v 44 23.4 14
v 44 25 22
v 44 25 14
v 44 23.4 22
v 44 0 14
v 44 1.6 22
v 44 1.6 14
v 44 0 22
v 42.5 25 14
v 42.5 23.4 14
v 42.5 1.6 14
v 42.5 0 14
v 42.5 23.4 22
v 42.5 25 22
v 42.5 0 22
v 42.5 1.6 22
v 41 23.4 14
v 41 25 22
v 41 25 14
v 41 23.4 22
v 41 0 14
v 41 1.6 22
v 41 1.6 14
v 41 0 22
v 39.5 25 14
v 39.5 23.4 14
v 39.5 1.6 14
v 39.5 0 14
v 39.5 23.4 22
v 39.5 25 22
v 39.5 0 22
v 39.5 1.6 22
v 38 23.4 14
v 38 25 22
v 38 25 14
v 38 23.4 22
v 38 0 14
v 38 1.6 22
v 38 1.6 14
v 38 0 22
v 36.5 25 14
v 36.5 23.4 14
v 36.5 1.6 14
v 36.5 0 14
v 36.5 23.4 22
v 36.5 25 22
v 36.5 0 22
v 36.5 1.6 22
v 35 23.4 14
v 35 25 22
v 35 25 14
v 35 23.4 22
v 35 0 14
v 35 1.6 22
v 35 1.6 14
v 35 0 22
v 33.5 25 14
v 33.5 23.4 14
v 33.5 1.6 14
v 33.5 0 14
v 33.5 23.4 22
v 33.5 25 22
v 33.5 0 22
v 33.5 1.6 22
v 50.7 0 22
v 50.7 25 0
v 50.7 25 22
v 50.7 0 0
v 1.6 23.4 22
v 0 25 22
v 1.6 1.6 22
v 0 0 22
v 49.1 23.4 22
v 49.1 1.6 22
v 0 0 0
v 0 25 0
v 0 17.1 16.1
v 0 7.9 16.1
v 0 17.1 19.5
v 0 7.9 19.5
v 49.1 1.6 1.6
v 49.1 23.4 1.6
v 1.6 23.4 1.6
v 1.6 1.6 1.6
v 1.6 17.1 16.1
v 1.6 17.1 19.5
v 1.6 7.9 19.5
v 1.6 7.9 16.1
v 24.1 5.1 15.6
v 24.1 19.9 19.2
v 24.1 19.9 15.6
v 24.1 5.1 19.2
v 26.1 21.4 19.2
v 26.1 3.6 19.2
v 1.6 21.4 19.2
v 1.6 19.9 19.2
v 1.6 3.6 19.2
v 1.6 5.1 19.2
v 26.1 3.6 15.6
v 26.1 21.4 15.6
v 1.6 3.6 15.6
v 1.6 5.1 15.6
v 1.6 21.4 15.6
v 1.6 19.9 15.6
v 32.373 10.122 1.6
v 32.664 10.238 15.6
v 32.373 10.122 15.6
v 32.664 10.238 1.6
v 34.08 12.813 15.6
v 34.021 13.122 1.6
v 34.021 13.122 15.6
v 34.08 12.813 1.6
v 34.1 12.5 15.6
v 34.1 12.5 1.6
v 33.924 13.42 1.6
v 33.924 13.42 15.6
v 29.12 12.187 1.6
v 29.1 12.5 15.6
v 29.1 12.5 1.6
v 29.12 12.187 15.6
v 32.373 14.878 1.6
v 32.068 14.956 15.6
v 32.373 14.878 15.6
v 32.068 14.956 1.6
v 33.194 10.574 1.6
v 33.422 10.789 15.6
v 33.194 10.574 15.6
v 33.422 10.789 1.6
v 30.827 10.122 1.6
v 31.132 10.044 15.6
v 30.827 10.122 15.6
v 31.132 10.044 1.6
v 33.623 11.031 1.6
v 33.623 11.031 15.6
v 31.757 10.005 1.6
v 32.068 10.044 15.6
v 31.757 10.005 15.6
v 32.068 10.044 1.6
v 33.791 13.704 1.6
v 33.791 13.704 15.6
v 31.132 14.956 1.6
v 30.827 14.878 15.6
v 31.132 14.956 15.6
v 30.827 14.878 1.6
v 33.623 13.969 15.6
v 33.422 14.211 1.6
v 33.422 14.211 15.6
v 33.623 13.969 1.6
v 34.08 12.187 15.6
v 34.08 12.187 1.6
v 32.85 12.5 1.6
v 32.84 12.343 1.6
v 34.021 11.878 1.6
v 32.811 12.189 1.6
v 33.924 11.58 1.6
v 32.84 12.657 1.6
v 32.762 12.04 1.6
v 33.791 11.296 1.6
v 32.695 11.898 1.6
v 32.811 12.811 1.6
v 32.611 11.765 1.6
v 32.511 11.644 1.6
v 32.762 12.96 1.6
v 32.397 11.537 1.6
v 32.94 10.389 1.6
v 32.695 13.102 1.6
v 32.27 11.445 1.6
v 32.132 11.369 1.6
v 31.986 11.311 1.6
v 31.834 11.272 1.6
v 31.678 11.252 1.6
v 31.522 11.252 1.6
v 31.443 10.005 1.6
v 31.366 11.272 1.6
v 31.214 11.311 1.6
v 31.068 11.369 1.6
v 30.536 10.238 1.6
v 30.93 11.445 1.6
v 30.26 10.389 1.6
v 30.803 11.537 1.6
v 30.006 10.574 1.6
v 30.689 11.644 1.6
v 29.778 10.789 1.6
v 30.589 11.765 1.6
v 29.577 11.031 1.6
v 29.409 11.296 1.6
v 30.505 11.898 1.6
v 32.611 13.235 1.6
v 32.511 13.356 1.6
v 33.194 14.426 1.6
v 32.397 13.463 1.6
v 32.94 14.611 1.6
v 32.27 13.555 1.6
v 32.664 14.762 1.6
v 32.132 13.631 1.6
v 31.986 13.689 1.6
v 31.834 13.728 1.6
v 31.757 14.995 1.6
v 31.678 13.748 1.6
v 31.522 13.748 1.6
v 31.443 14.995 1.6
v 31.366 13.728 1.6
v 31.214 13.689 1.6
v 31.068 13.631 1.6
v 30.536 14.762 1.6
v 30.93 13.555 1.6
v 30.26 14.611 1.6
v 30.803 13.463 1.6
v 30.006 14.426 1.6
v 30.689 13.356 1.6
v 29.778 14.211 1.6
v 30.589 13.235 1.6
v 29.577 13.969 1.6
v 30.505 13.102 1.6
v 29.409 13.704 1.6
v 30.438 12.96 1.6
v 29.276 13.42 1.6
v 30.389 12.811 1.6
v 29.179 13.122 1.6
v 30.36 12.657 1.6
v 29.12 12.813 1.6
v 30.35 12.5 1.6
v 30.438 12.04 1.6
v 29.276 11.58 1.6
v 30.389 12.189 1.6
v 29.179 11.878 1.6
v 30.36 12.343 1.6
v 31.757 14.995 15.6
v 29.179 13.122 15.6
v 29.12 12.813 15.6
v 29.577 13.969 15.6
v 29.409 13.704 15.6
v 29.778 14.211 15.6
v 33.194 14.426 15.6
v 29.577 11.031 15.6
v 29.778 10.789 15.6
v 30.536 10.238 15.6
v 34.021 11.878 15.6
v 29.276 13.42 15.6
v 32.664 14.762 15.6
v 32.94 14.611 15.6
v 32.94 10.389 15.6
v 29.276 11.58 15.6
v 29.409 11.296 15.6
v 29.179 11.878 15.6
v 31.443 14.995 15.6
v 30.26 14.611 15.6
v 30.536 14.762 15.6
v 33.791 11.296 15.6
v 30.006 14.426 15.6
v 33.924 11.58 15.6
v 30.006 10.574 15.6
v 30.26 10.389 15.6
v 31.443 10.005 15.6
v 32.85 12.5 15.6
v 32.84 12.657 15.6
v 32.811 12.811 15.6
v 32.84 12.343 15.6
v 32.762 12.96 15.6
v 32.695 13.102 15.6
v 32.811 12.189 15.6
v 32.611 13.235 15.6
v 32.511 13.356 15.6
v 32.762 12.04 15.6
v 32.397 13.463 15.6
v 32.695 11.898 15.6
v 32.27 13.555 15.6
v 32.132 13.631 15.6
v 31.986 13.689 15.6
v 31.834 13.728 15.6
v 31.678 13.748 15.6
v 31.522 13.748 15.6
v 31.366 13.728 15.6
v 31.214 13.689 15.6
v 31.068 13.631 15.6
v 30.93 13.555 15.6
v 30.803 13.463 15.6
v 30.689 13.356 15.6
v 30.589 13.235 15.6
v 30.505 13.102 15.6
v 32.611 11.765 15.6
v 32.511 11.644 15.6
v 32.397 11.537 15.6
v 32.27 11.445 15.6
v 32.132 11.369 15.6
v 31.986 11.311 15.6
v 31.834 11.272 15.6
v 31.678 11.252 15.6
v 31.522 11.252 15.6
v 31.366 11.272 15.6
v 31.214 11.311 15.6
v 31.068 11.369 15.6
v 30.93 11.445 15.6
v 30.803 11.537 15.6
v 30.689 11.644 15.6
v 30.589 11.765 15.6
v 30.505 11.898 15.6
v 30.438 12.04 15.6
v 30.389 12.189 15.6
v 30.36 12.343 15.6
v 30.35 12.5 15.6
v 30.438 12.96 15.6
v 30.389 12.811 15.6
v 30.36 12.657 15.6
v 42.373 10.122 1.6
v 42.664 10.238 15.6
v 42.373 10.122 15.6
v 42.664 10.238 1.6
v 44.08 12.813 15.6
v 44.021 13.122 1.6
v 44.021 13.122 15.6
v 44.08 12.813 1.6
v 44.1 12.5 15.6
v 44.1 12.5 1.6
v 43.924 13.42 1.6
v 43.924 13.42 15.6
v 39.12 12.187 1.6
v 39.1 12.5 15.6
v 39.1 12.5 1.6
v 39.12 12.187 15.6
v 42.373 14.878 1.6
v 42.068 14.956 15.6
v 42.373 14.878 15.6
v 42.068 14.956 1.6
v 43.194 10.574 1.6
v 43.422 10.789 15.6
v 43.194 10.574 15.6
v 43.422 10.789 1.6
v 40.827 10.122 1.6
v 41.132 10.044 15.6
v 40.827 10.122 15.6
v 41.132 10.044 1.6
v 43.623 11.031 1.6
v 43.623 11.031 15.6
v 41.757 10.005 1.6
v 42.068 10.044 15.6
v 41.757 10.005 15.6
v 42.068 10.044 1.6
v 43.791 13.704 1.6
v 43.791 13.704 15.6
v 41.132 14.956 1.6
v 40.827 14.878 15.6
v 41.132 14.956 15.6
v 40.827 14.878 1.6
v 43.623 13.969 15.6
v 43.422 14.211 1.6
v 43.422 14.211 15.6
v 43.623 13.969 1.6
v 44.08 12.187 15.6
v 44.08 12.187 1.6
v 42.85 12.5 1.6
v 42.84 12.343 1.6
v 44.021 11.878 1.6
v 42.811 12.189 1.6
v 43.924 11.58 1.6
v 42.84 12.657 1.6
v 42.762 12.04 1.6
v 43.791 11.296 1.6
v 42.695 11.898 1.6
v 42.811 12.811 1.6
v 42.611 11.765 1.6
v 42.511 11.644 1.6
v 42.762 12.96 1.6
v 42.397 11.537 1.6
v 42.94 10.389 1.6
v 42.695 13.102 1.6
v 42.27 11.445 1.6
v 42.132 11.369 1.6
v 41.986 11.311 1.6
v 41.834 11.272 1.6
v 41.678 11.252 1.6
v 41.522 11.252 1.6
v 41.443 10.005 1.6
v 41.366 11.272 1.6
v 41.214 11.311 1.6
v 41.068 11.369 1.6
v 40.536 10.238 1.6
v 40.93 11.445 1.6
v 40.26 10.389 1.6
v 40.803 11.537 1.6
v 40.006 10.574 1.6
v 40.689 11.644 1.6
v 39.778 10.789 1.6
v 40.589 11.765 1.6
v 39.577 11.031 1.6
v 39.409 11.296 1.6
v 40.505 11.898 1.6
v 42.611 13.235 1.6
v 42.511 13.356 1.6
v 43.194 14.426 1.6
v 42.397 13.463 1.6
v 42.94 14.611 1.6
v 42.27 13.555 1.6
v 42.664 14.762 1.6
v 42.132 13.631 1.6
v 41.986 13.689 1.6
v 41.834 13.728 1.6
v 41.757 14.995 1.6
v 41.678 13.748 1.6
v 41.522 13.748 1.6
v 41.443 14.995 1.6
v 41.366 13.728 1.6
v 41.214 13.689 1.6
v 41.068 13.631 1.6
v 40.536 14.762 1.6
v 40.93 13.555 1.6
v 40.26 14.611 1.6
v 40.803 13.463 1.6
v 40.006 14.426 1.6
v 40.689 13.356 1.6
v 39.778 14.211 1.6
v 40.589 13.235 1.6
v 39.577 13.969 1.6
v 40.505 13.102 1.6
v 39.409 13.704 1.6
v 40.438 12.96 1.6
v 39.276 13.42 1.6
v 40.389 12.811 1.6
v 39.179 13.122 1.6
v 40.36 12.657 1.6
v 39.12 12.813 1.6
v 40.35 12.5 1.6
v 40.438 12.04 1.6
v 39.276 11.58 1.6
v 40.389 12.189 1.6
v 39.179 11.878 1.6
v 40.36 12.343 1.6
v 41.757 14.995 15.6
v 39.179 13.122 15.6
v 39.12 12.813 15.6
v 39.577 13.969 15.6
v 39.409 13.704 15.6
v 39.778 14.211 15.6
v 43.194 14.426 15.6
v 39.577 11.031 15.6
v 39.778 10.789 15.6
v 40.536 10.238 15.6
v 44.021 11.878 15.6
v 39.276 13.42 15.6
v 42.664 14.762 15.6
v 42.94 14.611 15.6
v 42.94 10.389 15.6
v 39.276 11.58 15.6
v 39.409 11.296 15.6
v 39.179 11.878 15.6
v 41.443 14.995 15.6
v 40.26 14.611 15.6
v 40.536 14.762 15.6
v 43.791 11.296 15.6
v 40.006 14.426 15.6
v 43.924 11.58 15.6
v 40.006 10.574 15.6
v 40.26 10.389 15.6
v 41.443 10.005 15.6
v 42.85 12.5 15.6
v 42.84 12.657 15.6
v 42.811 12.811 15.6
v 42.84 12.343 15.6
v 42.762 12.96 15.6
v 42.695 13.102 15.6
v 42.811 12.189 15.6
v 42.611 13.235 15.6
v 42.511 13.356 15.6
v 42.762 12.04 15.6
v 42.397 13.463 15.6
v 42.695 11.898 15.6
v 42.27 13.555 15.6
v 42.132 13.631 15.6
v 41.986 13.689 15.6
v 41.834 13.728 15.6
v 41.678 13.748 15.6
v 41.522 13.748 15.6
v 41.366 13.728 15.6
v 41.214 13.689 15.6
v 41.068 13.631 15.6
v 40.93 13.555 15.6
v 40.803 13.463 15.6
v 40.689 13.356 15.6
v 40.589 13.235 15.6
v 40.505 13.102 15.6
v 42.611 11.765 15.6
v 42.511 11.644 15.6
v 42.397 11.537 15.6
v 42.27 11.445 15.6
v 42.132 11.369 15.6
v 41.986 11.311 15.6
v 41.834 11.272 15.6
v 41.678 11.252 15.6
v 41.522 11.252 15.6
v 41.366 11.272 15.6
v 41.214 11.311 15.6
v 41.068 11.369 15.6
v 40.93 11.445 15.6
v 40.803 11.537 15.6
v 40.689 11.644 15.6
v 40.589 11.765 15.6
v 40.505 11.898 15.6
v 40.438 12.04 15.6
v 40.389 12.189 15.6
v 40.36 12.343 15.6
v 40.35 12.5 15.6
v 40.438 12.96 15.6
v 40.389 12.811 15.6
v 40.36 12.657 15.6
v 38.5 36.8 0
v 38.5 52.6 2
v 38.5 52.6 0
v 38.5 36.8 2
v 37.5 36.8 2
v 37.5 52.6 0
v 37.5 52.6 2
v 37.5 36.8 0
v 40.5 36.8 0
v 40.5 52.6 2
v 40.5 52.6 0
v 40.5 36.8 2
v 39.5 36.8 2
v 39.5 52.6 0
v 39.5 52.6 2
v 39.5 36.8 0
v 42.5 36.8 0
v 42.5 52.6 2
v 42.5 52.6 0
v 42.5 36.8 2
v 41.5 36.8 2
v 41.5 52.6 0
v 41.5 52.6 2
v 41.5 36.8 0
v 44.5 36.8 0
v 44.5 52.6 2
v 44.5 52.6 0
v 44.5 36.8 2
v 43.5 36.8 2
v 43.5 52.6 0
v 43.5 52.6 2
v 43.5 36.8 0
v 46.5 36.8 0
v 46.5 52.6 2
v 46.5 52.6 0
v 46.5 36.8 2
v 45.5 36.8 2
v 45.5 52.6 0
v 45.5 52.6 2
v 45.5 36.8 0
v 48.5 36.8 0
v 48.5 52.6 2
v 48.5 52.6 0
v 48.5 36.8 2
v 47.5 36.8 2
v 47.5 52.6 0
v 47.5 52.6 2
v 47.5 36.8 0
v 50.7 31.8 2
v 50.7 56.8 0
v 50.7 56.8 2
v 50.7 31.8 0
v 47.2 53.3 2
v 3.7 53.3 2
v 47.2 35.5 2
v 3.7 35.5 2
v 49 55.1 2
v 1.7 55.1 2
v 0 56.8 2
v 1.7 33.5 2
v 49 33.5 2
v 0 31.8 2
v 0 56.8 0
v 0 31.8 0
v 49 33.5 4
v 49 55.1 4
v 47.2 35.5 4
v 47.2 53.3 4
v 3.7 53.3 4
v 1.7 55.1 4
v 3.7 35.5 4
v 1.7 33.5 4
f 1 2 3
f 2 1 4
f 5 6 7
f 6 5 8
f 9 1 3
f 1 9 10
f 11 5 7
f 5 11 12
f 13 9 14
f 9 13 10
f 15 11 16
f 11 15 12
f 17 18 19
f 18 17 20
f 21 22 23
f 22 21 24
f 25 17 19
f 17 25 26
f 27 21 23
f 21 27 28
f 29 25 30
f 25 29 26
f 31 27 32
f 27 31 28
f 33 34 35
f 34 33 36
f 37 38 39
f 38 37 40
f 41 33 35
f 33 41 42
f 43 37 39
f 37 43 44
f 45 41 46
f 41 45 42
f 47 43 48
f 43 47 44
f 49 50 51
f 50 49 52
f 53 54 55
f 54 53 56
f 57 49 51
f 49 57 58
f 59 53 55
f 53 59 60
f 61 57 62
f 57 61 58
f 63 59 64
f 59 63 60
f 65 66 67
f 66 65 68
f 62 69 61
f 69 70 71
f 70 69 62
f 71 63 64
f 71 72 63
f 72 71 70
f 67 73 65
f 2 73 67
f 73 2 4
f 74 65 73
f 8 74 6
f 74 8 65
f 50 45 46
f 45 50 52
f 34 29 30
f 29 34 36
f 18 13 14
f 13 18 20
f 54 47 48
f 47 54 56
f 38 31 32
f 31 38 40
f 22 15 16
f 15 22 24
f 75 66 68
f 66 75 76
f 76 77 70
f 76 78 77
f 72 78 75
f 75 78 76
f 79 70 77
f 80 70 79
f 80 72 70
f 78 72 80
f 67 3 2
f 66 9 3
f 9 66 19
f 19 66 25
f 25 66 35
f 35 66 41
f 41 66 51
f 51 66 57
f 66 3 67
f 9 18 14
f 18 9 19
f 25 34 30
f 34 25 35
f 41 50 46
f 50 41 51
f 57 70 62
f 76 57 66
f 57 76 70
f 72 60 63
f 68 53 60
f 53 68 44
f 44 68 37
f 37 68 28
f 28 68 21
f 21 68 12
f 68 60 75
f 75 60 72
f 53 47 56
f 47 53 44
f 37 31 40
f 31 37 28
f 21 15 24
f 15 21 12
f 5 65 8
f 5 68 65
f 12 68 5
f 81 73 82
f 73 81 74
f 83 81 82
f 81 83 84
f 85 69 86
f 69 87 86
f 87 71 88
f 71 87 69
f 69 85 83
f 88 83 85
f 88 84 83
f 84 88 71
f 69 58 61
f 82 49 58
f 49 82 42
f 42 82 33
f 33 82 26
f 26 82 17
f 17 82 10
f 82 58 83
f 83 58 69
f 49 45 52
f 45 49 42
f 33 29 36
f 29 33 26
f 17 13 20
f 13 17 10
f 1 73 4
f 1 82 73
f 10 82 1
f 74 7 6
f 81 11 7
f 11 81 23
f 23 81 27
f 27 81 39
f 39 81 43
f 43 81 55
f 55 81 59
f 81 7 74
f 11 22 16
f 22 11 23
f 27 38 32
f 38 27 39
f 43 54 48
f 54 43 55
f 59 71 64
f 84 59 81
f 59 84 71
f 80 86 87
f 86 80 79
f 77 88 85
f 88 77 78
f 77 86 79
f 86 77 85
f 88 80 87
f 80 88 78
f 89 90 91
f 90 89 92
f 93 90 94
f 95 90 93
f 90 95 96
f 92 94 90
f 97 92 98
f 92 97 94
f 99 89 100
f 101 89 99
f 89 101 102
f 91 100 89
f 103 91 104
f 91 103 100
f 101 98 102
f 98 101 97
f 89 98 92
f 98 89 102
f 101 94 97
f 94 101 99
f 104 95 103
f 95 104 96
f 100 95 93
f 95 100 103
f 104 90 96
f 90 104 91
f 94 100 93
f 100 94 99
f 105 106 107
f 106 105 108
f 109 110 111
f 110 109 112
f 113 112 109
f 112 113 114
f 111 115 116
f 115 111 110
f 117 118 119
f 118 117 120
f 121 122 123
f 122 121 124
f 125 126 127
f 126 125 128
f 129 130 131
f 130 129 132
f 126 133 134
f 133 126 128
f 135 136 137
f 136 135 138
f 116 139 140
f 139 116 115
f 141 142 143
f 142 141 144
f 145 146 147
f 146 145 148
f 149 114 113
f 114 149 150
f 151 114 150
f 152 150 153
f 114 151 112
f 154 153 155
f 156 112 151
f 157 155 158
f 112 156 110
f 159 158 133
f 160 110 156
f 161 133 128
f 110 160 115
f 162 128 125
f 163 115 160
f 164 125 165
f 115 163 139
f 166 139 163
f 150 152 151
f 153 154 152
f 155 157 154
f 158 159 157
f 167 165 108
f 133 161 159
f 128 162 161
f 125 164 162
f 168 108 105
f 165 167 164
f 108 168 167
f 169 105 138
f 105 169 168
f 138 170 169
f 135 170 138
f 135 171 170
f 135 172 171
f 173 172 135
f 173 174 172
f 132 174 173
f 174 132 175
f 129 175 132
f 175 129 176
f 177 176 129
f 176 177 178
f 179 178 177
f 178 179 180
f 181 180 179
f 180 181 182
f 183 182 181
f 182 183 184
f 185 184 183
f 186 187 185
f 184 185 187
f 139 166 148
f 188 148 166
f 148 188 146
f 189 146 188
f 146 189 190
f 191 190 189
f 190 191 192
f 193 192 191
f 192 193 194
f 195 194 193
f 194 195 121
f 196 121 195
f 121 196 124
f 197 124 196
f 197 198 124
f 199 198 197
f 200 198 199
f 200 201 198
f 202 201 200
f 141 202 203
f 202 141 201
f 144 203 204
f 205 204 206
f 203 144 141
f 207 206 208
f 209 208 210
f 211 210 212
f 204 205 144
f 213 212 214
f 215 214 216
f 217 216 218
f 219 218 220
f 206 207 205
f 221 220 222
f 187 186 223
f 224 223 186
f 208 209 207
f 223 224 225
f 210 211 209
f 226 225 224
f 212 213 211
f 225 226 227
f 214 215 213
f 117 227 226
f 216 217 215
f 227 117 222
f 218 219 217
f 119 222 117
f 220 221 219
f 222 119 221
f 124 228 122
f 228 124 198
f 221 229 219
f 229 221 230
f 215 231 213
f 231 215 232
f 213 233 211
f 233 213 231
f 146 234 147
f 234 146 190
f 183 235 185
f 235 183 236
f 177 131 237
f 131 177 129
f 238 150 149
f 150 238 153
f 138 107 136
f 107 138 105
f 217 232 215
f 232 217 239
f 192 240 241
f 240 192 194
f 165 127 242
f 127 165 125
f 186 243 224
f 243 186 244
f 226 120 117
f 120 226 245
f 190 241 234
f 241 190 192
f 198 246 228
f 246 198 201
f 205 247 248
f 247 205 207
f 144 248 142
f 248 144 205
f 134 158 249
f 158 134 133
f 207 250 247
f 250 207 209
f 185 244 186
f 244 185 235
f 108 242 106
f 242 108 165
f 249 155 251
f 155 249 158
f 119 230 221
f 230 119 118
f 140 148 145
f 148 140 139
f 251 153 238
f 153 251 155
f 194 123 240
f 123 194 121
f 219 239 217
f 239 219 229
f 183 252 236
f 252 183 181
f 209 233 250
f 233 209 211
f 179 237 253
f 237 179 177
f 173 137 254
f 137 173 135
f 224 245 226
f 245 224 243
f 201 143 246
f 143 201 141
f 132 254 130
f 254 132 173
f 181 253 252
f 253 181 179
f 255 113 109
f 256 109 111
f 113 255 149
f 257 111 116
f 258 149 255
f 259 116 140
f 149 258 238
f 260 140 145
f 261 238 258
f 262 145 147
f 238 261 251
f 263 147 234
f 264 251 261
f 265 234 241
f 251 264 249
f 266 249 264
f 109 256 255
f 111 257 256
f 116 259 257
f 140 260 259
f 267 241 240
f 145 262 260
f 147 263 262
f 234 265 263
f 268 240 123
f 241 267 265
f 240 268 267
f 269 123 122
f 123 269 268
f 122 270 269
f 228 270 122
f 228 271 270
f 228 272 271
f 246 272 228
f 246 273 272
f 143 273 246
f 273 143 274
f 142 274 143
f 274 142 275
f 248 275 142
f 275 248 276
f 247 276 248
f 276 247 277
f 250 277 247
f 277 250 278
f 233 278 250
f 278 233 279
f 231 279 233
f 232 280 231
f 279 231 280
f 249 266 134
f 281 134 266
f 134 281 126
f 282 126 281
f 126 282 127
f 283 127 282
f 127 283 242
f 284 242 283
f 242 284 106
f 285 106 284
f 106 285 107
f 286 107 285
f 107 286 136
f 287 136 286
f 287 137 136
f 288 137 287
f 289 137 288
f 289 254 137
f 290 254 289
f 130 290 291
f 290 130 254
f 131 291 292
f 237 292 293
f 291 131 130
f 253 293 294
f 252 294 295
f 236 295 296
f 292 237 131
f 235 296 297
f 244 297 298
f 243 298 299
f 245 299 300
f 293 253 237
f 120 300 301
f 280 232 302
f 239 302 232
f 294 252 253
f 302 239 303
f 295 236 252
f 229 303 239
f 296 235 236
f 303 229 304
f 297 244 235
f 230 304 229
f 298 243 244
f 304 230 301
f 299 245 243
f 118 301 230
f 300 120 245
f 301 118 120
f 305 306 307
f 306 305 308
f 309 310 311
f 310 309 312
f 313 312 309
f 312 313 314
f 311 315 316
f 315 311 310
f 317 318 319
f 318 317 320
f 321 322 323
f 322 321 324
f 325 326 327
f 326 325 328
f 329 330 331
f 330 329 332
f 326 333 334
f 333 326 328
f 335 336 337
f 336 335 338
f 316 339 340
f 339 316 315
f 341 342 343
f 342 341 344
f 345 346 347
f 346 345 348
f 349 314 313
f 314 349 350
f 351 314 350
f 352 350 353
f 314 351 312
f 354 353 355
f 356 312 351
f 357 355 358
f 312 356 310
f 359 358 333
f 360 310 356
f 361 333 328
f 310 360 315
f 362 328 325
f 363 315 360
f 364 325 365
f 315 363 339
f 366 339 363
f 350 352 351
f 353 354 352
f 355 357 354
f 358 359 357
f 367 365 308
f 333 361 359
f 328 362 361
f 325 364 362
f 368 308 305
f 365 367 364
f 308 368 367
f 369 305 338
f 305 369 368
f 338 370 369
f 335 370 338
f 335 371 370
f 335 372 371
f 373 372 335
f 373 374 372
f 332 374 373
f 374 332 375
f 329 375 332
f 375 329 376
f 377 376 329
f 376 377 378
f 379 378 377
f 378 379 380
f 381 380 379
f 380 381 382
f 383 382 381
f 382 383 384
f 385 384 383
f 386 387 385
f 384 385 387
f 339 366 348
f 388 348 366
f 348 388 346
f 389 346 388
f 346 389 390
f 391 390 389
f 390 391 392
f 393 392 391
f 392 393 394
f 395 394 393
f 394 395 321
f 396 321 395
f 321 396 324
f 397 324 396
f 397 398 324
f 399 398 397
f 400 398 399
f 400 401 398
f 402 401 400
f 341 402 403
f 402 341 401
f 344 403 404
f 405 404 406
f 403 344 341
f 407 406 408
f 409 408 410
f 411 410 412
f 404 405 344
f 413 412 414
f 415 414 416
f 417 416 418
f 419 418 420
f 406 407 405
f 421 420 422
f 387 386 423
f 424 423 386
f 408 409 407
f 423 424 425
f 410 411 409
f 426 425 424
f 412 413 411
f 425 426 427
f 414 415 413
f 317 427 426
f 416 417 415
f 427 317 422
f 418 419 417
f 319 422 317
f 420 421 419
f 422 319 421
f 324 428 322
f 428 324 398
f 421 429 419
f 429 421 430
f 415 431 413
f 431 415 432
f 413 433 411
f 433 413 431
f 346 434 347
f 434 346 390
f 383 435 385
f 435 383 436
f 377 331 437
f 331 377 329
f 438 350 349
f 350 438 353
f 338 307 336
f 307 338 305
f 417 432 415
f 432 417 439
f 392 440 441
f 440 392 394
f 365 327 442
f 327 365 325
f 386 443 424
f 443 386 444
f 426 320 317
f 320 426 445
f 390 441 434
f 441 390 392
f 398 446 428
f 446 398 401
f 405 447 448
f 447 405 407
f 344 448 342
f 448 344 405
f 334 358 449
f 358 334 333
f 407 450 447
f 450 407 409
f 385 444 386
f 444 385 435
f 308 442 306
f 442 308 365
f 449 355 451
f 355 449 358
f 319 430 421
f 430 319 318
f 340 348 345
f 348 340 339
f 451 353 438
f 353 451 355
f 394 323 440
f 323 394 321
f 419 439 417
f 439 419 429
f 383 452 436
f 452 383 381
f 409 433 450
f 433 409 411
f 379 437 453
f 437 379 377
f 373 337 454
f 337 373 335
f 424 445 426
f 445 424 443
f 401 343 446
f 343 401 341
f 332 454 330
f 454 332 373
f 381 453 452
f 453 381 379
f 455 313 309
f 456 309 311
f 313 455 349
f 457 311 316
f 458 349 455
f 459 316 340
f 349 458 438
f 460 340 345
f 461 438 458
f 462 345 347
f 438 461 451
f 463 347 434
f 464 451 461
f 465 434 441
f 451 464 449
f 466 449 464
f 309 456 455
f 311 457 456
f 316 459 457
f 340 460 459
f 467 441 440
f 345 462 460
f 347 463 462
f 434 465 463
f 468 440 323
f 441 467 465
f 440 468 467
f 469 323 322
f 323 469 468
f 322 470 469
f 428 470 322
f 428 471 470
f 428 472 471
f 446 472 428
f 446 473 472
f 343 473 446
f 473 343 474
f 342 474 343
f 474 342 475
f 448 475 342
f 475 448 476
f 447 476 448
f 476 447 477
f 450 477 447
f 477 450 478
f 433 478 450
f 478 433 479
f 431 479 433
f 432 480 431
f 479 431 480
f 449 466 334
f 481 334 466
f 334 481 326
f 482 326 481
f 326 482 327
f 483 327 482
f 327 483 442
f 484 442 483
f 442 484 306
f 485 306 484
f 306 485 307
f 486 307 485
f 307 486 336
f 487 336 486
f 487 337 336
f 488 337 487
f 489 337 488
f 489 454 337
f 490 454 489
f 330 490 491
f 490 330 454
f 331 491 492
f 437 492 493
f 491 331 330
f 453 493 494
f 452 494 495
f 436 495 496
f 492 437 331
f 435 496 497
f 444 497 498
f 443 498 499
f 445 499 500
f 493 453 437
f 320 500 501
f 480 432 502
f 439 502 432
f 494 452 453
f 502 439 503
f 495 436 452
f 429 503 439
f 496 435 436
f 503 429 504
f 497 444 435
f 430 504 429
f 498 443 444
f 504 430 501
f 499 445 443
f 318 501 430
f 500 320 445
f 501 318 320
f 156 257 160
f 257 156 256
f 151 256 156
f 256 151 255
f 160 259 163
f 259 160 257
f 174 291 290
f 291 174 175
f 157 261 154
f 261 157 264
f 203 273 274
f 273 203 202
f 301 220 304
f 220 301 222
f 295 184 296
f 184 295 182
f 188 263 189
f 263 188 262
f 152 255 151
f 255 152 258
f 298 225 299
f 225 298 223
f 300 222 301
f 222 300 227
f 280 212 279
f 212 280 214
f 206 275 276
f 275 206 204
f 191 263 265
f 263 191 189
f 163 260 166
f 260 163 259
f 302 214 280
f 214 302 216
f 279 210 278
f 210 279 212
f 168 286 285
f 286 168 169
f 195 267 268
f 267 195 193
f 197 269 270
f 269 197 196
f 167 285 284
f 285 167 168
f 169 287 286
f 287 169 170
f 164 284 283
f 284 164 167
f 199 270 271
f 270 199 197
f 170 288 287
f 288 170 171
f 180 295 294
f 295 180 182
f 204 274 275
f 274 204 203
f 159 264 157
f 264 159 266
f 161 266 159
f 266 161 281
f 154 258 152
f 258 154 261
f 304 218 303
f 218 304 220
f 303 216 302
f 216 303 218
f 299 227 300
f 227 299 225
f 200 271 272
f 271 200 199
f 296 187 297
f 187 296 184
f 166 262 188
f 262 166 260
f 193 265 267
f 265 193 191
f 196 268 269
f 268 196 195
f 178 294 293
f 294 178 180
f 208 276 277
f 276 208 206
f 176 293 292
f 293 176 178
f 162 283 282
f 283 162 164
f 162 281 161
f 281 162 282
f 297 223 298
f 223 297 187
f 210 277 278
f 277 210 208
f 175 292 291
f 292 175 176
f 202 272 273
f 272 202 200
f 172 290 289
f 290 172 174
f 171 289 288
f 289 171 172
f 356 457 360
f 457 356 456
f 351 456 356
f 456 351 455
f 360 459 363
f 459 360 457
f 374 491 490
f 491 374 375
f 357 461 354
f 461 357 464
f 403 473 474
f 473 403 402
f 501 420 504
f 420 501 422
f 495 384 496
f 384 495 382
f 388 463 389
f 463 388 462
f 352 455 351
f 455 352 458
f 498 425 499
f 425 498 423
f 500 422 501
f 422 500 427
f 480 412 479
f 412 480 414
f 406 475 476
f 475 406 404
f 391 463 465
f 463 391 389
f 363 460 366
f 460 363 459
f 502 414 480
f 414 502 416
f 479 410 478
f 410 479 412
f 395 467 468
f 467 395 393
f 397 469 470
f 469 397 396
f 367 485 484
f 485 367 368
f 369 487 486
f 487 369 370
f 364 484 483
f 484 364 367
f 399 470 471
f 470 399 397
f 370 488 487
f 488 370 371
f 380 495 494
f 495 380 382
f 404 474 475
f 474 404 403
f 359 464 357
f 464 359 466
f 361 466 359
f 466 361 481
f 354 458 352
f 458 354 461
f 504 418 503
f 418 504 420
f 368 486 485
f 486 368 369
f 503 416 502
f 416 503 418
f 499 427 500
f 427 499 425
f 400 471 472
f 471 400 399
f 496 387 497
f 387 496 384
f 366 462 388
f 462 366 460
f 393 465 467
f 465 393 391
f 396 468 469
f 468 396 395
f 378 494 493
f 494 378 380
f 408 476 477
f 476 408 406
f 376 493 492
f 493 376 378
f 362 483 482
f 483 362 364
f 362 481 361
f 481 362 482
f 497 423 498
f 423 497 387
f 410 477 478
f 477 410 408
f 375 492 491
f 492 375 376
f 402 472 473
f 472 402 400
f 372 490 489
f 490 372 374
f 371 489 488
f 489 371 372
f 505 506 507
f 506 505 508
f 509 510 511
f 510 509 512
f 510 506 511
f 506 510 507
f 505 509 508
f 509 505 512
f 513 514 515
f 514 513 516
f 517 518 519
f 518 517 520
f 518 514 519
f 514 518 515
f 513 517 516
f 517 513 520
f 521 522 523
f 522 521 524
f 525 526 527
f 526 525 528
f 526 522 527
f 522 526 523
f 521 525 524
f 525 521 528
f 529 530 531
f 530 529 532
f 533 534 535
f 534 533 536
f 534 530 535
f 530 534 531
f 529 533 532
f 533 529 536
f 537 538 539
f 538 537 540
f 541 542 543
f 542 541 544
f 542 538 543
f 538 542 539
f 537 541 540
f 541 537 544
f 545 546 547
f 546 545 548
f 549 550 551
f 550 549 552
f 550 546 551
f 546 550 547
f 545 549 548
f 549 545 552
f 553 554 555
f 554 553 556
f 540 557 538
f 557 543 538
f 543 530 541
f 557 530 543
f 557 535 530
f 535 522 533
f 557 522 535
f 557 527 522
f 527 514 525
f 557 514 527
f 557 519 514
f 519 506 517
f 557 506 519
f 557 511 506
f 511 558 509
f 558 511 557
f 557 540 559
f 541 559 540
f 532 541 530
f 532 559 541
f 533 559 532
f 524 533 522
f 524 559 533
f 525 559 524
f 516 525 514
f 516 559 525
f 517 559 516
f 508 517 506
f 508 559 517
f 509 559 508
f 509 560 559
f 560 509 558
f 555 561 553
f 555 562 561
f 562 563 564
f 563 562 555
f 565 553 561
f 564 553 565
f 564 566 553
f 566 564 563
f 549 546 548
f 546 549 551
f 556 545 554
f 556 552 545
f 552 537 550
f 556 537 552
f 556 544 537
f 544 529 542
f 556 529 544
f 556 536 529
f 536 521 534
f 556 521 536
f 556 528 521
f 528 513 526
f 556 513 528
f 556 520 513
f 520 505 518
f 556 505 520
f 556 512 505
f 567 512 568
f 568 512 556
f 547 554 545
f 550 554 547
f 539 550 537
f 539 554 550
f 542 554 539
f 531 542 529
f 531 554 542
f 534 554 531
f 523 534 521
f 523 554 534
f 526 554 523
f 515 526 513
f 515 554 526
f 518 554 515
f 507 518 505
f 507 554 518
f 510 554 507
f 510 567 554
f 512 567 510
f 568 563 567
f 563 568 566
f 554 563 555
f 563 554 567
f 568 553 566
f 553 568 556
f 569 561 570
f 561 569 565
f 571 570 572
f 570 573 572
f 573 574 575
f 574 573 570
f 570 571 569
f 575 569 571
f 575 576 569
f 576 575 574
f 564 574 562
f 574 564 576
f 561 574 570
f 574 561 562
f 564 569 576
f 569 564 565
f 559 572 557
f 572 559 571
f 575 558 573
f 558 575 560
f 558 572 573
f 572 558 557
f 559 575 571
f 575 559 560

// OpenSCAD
/*
    Project: Seeed XIAO ESP32-C6 + BME280 Enclosure
    Author: Gemini (via User Request)
    Date: 2025-12-20
    
    Description:
    A compact case with a "false floor" to accommodate header pins and jumper wires.
    The XIAO and BME280 sit side-by-side to minimize thermal interference.
    
    Hardware:
    - Seeed XIAO ESP32-C6 (21 x 17.8mm)
    - Tstar BME280 (15 x 11.52mm)
*/

// --- Global Parameters ---
$fn = 50; // Resolution for circles

// Tolerances (Adjust for your printer)
tolerance = 0.2; 
wall_thickness = 1.6;

// Internal Clearance for Wires (The "Basement")
wire_clearance_height = 14; 

// --- XIAO Dimensions ---
xiao_len = 22.5; // Slight extra for USB protrusion
xiao_wid = 17.8;
xiao_pcb_thick = 1.6;
usb_c_width = 9.2;
usb_c_height = 3.4;

// --- BME280 Dimensions (Tstar Type B) ---
bme_len = 15;
bme_wid = 11.52;
bme_hole_diam = 3.0; 
bme_hole_dist = 10; // DISTANCE BETWEEN HOLES (Adjust this if needed!)

// Total Case Layout
case_len = xiao_len + bme_len + 10; // Extra room for spacing
case_wid = xiao_wid + 4;
case_height = wire_clearance_height + 8; // Wire space + component headroom

// --- Modules ---

module case_body() {
    difference() {
        // Outer Shell
        cube([case_len + 2*wall_thickness, case_wid + 2*wall_thickness, case_height]);
        
        // Inner Cavity
        translate([wall_thickness, wall_thickness, wall_thickness])
            cube([case_len, case_wid, case_height + 1]);
        
        // USB Cutout (Front)
        translate([-1, (case_wid/2) + wall_thickness - (usb_c_width/2), wire_clearance_height + wall_thickness + 0.5])
            cube([5, usb_c_width, usb_c_height]);
            
        // Ventilation Slots (Back/Side near Sensor)
        for(i=[0:3]) {
            translate([case_len - 5 - (i*3), -1, wire_clearance_height])
                cube([1.5, case_wid + 10, case_height/2]);
        }
    }
}

module internals() {
    // 1. XIAO Mounting Rails
    // These hold the PCB by the edge (1mm bite)
    translate([wall_thickness, wall_thickness + (case_wid-xiao_wid)/2, wall_thickness]) {
        
        // Left Rail
        translate([0, 0, wire_clearance_height])
            cube([xiao_len, 1.5, xiao_pcb_thick + 2]);
            
        // Right Rail
        translate([0, xiao_wid - 1.5, wire_clearance_height])
            cube([xiao_len, 1.5, xiao_pcb_thick + 2]);
            
        // Back Stop (Prevents pushing board in too far)
        translate([xiao_len, 0, wire_clearance_height])
            cube([2, xiao_wid, xiao_pcb_thick + 2]);
    }
    
    // 2. BME280 Standoffs
    // Located behind the XIAO
    sensor_x_offset = wall_thickness + xiao_len + 5;
    sensor_y_offset = wall_thickness + (case_wid - bme_wid)/2;
    
    translate([sensor_x_offset, sensor_y_offset, wall_thickness]) {
        // Post 1
        translate([2.5, bme_wid/2, 0])
            cylinder(h=wire_clearance_height, d=5);
            
        // Post 2 (Adjust distance based on bme_hole_dist)
        translate([2.5 + bme_hole_dist, bme_wid/2, 0])
            cylinder(h=wire_clearance_height, d=5);
    }
}

module screw_holes() {
    // Cuts the actual screw holes into the standoffs
    sensor_x_offset = wall_thickness + xiao_len + 5;
    sensor_y_offset = wall_thickness + (case_wid - bme_wid)/2;
    
    translate([sensor_x_offset, sensor_y_offset, wall_thickness]) {
        // Hole 1
        translate([2.5, bme_wid/2, 0])
            cylinder(h=wire_clearance_height+1, d=bme_hole_diam - 0.5); // Slightly smaller for self-tapping
            
        // Hole 2
        translate([2.5 + bme_hole_dist, bme_wid/2, 0])
            cylinder(h=wire_clearance_height+1, d=bme_hole_diam - 0.5);
    }
}

module lid() {
    lid_clearance = 0.1; // Make it slightly smaller to fit
    
    translate([0, case_wid + 10, 0]) { // Move lid to side for printing
        difference() {
            // Main Lid Plate
            cube([case_len + 2*wall_thickness, case_wid + 2*wall_thickness, 2]);
            
            // Ventilation Grid over Sensor
            for(i=[0:5]) {
                translate([case_len - 10 + (i*2), 5, -1])
                    cube([1, case_wid - 6, 4]);
            }
        }
        
        // Inner Lip (Snap fit)
        translate([wall_thickness + lid_clearance, wall_thickness + lid_clearance, 2])
            difference() {
                cube([case_len - 2*lid_clearance, case_wid - 2*lid_clearance, 2]);
                translate([2, 2, -1])
                    cube([case_len - 4, case_wid - 4, 4]);
            }
    }
}

// --- Render Assembly ---

// 1. The Main Box
difference() {
    union() {
        case_body();
        internals();
    }
    screw_holes();
}

// 2. The Lid (Printed to the side)
lid();
